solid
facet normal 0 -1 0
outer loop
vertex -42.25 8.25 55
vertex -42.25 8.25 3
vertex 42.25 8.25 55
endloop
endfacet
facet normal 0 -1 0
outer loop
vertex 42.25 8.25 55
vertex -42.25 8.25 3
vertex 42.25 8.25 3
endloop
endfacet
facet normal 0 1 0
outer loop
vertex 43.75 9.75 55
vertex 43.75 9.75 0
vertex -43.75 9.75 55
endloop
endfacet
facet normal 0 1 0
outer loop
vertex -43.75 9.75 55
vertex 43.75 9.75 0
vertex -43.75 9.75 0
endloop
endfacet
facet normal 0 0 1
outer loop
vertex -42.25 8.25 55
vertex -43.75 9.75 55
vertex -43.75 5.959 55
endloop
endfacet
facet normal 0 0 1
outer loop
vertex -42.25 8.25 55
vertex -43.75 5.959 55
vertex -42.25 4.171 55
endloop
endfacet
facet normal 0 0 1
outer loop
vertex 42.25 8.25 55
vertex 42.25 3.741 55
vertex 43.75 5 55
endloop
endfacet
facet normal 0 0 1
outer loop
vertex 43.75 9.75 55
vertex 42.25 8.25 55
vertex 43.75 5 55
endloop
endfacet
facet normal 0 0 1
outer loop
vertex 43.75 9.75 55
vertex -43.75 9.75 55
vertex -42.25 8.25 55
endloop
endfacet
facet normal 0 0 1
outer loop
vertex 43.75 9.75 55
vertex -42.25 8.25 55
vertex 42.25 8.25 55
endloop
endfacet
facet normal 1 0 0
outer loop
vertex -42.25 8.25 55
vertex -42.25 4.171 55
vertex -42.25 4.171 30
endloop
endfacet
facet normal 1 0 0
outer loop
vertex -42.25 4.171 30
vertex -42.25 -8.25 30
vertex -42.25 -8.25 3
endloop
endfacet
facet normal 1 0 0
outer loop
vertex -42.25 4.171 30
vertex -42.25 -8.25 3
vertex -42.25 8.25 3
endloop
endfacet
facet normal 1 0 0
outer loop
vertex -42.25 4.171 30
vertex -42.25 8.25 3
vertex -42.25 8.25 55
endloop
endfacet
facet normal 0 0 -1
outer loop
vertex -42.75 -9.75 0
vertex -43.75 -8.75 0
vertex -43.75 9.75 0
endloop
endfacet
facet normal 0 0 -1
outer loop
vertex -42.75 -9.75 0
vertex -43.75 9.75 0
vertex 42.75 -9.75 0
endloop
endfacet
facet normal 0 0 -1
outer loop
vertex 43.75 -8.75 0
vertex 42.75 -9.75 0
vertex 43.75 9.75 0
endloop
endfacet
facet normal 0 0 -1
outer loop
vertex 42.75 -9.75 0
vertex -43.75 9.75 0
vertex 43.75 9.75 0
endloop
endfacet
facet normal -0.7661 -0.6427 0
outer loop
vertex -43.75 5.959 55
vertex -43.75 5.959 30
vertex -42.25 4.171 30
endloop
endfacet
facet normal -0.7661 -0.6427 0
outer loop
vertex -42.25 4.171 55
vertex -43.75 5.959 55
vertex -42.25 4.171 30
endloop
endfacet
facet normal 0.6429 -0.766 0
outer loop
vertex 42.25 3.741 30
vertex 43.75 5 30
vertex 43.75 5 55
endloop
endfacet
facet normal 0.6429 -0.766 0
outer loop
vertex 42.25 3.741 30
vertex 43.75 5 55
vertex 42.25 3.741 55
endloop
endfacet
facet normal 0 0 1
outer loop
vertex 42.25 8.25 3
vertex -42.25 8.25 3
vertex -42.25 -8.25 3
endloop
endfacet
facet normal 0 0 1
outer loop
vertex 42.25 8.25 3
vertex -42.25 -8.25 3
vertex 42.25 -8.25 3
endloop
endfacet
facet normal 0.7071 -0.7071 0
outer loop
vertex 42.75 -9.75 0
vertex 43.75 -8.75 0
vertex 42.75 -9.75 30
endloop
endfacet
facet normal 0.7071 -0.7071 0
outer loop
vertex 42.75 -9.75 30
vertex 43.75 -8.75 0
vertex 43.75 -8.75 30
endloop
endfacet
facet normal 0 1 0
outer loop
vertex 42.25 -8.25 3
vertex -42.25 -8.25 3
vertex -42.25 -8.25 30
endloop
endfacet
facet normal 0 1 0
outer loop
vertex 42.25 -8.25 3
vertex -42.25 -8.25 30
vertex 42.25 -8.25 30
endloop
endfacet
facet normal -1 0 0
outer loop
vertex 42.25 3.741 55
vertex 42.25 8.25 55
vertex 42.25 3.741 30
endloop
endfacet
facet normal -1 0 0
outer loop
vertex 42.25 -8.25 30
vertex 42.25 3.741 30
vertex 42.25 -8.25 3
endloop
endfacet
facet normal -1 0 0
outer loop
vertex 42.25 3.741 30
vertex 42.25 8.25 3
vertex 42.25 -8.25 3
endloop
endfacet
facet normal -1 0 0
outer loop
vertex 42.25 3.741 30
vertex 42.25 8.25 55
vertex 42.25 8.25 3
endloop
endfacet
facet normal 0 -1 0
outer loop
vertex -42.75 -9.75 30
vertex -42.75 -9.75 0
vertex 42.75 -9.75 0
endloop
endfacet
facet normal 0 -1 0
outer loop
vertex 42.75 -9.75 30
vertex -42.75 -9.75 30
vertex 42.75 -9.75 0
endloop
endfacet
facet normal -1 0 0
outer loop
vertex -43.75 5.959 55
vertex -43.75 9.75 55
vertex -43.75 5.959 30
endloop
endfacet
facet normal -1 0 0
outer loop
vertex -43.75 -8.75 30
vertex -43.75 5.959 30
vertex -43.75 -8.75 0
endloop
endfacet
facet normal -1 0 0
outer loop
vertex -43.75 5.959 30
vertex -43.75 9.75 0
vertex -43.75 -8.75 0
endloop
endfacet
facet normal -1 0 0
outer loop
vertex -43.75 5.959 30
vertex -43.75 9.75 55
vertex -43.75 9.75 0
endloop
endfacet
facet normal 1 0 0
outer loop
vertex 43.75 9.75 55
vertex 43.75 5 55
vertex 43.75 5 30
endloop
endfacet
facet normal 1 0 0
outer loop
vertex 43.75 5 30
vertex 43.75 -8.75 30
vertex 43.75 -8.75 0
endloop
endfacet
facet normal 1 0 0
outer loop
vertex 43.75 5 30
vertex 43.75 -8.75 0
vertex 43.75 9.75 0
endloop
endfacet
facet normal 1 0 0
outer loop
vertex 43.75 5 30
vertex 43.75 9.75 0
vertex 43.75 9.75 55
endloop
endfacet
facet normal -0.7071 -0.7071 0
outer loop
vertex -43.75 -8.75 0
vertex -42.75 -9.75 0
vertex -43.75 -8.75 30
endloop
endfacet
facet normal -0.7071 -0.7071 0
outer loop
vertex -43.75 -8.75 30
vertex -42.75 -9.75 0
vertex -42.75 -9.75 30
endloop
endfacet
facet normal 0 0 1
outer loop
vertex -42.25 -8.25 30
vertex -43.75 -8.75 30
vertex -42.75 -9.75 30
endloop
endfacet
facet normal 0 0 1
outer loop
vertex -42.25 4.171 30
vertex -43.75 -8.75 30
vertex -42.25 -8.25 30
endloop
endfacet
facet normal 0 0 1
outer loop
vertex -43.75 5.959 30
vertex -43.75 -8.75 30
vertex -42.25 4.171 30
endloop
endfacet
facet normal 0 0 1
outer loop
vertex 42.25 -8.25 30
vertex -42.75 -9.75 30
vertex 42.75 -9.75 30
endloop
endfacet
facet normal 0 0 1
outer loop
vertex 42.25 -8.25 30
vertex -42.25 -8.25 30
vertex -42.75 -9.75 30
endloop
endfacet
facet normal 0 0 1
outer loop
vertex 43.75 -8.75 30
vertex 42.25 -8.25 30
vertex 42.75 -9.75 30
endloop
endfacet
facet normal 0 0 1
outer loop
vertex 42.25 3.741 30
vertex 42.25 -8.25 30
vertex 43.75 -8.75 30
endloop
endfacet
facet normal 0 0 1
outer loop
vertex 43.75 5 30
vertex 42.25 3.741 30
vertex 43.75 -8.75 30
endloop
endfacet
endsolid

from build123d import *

# Parameters (mm, degrees)
F0_W        = 87.5
F0_H        = 19.5
F0_W_2      = 84.5
F0_H_2      = 16.5
F1_DEPTH    = 30
F2_DEPTH    = 3
F3_SIZE     = 1
F5_DEPTH    = 25
F6_DEPTH    = 25
F7_T1_DEPTH = 40.3581649162


# Not quite as in the source:
# - a fillet or chamfer that OpenCascade refuses, or shapes differently, is made with other operations: its cross-section is extruded or revolved along the edge and cut away or added


with BuildPart() as f1:
    # F0 (on Top) → F1 (new body)
    with BuildSketch(Plane.XY):
        Rectangle(F0_W, F0_H)
        Rectangle(F0_W_2, F0_H_2, mode=Mode.SUBTRACT)
    extrude(amount=F1_DEPTH)

    # F0 (on Top) → F2 (join)
    with BuildSketch(Plane.XY):
        Rectangle(F0_W_2, F0_H_2)
    extrude(amount=F2_DEPTH)

    # F3
    f3_edges = [f1.edges().sort_by_distance(p)[0] for p in [
        (-43.75, -9.75, 15),
        (43.75, -9.75, 15),
    ]]
    chamfer(f3_edges, length=F3_SIZE)

    # F4 (on face) → F5 (join)
    with BuildSketch(Plane.XY.offset(30)):
        Polygon((-43.75, 9.75), (-43.75, 0), (-42.25, 0), (-42.25, 8.25), (42.25, 8.25), (42.25, 0), (43.75, 0), (43.75, 9.75), align=None)
    extrude(amount=F5_DEPTH)

    # F4 (on face) → F6 (cut)
    with BuildSketch(Plane.XY.offset(30)):
        Polygon((50.0001870096, 0), (-45.6664785743, 0), (-48.1942594051, -2.8349049389), (-42.25, -20.2376823872), (42.25, -19.071014598), align=None)
    extrude(amount=F6_DEPTH, mode=Mode.SUBTRACT)

    # F7: chamfer of 5 x 5.958767963 on 2 edges, made by hand

    # F7_s2 → F7_t1 (cut)
    with BuildSketch(Plane.XY.offset(30)):
        Polygon((-43.75, 5.958767963), (-38.75, 0), (-43.75, 0), align=None)
        Polygon((43.75, 5), (37.791232037, 0), (43.75, 0), align=None)
    extrude(amount=F7_T1_DEPTH, mode=Mode.SUBTRACT)


solid = f1.part
